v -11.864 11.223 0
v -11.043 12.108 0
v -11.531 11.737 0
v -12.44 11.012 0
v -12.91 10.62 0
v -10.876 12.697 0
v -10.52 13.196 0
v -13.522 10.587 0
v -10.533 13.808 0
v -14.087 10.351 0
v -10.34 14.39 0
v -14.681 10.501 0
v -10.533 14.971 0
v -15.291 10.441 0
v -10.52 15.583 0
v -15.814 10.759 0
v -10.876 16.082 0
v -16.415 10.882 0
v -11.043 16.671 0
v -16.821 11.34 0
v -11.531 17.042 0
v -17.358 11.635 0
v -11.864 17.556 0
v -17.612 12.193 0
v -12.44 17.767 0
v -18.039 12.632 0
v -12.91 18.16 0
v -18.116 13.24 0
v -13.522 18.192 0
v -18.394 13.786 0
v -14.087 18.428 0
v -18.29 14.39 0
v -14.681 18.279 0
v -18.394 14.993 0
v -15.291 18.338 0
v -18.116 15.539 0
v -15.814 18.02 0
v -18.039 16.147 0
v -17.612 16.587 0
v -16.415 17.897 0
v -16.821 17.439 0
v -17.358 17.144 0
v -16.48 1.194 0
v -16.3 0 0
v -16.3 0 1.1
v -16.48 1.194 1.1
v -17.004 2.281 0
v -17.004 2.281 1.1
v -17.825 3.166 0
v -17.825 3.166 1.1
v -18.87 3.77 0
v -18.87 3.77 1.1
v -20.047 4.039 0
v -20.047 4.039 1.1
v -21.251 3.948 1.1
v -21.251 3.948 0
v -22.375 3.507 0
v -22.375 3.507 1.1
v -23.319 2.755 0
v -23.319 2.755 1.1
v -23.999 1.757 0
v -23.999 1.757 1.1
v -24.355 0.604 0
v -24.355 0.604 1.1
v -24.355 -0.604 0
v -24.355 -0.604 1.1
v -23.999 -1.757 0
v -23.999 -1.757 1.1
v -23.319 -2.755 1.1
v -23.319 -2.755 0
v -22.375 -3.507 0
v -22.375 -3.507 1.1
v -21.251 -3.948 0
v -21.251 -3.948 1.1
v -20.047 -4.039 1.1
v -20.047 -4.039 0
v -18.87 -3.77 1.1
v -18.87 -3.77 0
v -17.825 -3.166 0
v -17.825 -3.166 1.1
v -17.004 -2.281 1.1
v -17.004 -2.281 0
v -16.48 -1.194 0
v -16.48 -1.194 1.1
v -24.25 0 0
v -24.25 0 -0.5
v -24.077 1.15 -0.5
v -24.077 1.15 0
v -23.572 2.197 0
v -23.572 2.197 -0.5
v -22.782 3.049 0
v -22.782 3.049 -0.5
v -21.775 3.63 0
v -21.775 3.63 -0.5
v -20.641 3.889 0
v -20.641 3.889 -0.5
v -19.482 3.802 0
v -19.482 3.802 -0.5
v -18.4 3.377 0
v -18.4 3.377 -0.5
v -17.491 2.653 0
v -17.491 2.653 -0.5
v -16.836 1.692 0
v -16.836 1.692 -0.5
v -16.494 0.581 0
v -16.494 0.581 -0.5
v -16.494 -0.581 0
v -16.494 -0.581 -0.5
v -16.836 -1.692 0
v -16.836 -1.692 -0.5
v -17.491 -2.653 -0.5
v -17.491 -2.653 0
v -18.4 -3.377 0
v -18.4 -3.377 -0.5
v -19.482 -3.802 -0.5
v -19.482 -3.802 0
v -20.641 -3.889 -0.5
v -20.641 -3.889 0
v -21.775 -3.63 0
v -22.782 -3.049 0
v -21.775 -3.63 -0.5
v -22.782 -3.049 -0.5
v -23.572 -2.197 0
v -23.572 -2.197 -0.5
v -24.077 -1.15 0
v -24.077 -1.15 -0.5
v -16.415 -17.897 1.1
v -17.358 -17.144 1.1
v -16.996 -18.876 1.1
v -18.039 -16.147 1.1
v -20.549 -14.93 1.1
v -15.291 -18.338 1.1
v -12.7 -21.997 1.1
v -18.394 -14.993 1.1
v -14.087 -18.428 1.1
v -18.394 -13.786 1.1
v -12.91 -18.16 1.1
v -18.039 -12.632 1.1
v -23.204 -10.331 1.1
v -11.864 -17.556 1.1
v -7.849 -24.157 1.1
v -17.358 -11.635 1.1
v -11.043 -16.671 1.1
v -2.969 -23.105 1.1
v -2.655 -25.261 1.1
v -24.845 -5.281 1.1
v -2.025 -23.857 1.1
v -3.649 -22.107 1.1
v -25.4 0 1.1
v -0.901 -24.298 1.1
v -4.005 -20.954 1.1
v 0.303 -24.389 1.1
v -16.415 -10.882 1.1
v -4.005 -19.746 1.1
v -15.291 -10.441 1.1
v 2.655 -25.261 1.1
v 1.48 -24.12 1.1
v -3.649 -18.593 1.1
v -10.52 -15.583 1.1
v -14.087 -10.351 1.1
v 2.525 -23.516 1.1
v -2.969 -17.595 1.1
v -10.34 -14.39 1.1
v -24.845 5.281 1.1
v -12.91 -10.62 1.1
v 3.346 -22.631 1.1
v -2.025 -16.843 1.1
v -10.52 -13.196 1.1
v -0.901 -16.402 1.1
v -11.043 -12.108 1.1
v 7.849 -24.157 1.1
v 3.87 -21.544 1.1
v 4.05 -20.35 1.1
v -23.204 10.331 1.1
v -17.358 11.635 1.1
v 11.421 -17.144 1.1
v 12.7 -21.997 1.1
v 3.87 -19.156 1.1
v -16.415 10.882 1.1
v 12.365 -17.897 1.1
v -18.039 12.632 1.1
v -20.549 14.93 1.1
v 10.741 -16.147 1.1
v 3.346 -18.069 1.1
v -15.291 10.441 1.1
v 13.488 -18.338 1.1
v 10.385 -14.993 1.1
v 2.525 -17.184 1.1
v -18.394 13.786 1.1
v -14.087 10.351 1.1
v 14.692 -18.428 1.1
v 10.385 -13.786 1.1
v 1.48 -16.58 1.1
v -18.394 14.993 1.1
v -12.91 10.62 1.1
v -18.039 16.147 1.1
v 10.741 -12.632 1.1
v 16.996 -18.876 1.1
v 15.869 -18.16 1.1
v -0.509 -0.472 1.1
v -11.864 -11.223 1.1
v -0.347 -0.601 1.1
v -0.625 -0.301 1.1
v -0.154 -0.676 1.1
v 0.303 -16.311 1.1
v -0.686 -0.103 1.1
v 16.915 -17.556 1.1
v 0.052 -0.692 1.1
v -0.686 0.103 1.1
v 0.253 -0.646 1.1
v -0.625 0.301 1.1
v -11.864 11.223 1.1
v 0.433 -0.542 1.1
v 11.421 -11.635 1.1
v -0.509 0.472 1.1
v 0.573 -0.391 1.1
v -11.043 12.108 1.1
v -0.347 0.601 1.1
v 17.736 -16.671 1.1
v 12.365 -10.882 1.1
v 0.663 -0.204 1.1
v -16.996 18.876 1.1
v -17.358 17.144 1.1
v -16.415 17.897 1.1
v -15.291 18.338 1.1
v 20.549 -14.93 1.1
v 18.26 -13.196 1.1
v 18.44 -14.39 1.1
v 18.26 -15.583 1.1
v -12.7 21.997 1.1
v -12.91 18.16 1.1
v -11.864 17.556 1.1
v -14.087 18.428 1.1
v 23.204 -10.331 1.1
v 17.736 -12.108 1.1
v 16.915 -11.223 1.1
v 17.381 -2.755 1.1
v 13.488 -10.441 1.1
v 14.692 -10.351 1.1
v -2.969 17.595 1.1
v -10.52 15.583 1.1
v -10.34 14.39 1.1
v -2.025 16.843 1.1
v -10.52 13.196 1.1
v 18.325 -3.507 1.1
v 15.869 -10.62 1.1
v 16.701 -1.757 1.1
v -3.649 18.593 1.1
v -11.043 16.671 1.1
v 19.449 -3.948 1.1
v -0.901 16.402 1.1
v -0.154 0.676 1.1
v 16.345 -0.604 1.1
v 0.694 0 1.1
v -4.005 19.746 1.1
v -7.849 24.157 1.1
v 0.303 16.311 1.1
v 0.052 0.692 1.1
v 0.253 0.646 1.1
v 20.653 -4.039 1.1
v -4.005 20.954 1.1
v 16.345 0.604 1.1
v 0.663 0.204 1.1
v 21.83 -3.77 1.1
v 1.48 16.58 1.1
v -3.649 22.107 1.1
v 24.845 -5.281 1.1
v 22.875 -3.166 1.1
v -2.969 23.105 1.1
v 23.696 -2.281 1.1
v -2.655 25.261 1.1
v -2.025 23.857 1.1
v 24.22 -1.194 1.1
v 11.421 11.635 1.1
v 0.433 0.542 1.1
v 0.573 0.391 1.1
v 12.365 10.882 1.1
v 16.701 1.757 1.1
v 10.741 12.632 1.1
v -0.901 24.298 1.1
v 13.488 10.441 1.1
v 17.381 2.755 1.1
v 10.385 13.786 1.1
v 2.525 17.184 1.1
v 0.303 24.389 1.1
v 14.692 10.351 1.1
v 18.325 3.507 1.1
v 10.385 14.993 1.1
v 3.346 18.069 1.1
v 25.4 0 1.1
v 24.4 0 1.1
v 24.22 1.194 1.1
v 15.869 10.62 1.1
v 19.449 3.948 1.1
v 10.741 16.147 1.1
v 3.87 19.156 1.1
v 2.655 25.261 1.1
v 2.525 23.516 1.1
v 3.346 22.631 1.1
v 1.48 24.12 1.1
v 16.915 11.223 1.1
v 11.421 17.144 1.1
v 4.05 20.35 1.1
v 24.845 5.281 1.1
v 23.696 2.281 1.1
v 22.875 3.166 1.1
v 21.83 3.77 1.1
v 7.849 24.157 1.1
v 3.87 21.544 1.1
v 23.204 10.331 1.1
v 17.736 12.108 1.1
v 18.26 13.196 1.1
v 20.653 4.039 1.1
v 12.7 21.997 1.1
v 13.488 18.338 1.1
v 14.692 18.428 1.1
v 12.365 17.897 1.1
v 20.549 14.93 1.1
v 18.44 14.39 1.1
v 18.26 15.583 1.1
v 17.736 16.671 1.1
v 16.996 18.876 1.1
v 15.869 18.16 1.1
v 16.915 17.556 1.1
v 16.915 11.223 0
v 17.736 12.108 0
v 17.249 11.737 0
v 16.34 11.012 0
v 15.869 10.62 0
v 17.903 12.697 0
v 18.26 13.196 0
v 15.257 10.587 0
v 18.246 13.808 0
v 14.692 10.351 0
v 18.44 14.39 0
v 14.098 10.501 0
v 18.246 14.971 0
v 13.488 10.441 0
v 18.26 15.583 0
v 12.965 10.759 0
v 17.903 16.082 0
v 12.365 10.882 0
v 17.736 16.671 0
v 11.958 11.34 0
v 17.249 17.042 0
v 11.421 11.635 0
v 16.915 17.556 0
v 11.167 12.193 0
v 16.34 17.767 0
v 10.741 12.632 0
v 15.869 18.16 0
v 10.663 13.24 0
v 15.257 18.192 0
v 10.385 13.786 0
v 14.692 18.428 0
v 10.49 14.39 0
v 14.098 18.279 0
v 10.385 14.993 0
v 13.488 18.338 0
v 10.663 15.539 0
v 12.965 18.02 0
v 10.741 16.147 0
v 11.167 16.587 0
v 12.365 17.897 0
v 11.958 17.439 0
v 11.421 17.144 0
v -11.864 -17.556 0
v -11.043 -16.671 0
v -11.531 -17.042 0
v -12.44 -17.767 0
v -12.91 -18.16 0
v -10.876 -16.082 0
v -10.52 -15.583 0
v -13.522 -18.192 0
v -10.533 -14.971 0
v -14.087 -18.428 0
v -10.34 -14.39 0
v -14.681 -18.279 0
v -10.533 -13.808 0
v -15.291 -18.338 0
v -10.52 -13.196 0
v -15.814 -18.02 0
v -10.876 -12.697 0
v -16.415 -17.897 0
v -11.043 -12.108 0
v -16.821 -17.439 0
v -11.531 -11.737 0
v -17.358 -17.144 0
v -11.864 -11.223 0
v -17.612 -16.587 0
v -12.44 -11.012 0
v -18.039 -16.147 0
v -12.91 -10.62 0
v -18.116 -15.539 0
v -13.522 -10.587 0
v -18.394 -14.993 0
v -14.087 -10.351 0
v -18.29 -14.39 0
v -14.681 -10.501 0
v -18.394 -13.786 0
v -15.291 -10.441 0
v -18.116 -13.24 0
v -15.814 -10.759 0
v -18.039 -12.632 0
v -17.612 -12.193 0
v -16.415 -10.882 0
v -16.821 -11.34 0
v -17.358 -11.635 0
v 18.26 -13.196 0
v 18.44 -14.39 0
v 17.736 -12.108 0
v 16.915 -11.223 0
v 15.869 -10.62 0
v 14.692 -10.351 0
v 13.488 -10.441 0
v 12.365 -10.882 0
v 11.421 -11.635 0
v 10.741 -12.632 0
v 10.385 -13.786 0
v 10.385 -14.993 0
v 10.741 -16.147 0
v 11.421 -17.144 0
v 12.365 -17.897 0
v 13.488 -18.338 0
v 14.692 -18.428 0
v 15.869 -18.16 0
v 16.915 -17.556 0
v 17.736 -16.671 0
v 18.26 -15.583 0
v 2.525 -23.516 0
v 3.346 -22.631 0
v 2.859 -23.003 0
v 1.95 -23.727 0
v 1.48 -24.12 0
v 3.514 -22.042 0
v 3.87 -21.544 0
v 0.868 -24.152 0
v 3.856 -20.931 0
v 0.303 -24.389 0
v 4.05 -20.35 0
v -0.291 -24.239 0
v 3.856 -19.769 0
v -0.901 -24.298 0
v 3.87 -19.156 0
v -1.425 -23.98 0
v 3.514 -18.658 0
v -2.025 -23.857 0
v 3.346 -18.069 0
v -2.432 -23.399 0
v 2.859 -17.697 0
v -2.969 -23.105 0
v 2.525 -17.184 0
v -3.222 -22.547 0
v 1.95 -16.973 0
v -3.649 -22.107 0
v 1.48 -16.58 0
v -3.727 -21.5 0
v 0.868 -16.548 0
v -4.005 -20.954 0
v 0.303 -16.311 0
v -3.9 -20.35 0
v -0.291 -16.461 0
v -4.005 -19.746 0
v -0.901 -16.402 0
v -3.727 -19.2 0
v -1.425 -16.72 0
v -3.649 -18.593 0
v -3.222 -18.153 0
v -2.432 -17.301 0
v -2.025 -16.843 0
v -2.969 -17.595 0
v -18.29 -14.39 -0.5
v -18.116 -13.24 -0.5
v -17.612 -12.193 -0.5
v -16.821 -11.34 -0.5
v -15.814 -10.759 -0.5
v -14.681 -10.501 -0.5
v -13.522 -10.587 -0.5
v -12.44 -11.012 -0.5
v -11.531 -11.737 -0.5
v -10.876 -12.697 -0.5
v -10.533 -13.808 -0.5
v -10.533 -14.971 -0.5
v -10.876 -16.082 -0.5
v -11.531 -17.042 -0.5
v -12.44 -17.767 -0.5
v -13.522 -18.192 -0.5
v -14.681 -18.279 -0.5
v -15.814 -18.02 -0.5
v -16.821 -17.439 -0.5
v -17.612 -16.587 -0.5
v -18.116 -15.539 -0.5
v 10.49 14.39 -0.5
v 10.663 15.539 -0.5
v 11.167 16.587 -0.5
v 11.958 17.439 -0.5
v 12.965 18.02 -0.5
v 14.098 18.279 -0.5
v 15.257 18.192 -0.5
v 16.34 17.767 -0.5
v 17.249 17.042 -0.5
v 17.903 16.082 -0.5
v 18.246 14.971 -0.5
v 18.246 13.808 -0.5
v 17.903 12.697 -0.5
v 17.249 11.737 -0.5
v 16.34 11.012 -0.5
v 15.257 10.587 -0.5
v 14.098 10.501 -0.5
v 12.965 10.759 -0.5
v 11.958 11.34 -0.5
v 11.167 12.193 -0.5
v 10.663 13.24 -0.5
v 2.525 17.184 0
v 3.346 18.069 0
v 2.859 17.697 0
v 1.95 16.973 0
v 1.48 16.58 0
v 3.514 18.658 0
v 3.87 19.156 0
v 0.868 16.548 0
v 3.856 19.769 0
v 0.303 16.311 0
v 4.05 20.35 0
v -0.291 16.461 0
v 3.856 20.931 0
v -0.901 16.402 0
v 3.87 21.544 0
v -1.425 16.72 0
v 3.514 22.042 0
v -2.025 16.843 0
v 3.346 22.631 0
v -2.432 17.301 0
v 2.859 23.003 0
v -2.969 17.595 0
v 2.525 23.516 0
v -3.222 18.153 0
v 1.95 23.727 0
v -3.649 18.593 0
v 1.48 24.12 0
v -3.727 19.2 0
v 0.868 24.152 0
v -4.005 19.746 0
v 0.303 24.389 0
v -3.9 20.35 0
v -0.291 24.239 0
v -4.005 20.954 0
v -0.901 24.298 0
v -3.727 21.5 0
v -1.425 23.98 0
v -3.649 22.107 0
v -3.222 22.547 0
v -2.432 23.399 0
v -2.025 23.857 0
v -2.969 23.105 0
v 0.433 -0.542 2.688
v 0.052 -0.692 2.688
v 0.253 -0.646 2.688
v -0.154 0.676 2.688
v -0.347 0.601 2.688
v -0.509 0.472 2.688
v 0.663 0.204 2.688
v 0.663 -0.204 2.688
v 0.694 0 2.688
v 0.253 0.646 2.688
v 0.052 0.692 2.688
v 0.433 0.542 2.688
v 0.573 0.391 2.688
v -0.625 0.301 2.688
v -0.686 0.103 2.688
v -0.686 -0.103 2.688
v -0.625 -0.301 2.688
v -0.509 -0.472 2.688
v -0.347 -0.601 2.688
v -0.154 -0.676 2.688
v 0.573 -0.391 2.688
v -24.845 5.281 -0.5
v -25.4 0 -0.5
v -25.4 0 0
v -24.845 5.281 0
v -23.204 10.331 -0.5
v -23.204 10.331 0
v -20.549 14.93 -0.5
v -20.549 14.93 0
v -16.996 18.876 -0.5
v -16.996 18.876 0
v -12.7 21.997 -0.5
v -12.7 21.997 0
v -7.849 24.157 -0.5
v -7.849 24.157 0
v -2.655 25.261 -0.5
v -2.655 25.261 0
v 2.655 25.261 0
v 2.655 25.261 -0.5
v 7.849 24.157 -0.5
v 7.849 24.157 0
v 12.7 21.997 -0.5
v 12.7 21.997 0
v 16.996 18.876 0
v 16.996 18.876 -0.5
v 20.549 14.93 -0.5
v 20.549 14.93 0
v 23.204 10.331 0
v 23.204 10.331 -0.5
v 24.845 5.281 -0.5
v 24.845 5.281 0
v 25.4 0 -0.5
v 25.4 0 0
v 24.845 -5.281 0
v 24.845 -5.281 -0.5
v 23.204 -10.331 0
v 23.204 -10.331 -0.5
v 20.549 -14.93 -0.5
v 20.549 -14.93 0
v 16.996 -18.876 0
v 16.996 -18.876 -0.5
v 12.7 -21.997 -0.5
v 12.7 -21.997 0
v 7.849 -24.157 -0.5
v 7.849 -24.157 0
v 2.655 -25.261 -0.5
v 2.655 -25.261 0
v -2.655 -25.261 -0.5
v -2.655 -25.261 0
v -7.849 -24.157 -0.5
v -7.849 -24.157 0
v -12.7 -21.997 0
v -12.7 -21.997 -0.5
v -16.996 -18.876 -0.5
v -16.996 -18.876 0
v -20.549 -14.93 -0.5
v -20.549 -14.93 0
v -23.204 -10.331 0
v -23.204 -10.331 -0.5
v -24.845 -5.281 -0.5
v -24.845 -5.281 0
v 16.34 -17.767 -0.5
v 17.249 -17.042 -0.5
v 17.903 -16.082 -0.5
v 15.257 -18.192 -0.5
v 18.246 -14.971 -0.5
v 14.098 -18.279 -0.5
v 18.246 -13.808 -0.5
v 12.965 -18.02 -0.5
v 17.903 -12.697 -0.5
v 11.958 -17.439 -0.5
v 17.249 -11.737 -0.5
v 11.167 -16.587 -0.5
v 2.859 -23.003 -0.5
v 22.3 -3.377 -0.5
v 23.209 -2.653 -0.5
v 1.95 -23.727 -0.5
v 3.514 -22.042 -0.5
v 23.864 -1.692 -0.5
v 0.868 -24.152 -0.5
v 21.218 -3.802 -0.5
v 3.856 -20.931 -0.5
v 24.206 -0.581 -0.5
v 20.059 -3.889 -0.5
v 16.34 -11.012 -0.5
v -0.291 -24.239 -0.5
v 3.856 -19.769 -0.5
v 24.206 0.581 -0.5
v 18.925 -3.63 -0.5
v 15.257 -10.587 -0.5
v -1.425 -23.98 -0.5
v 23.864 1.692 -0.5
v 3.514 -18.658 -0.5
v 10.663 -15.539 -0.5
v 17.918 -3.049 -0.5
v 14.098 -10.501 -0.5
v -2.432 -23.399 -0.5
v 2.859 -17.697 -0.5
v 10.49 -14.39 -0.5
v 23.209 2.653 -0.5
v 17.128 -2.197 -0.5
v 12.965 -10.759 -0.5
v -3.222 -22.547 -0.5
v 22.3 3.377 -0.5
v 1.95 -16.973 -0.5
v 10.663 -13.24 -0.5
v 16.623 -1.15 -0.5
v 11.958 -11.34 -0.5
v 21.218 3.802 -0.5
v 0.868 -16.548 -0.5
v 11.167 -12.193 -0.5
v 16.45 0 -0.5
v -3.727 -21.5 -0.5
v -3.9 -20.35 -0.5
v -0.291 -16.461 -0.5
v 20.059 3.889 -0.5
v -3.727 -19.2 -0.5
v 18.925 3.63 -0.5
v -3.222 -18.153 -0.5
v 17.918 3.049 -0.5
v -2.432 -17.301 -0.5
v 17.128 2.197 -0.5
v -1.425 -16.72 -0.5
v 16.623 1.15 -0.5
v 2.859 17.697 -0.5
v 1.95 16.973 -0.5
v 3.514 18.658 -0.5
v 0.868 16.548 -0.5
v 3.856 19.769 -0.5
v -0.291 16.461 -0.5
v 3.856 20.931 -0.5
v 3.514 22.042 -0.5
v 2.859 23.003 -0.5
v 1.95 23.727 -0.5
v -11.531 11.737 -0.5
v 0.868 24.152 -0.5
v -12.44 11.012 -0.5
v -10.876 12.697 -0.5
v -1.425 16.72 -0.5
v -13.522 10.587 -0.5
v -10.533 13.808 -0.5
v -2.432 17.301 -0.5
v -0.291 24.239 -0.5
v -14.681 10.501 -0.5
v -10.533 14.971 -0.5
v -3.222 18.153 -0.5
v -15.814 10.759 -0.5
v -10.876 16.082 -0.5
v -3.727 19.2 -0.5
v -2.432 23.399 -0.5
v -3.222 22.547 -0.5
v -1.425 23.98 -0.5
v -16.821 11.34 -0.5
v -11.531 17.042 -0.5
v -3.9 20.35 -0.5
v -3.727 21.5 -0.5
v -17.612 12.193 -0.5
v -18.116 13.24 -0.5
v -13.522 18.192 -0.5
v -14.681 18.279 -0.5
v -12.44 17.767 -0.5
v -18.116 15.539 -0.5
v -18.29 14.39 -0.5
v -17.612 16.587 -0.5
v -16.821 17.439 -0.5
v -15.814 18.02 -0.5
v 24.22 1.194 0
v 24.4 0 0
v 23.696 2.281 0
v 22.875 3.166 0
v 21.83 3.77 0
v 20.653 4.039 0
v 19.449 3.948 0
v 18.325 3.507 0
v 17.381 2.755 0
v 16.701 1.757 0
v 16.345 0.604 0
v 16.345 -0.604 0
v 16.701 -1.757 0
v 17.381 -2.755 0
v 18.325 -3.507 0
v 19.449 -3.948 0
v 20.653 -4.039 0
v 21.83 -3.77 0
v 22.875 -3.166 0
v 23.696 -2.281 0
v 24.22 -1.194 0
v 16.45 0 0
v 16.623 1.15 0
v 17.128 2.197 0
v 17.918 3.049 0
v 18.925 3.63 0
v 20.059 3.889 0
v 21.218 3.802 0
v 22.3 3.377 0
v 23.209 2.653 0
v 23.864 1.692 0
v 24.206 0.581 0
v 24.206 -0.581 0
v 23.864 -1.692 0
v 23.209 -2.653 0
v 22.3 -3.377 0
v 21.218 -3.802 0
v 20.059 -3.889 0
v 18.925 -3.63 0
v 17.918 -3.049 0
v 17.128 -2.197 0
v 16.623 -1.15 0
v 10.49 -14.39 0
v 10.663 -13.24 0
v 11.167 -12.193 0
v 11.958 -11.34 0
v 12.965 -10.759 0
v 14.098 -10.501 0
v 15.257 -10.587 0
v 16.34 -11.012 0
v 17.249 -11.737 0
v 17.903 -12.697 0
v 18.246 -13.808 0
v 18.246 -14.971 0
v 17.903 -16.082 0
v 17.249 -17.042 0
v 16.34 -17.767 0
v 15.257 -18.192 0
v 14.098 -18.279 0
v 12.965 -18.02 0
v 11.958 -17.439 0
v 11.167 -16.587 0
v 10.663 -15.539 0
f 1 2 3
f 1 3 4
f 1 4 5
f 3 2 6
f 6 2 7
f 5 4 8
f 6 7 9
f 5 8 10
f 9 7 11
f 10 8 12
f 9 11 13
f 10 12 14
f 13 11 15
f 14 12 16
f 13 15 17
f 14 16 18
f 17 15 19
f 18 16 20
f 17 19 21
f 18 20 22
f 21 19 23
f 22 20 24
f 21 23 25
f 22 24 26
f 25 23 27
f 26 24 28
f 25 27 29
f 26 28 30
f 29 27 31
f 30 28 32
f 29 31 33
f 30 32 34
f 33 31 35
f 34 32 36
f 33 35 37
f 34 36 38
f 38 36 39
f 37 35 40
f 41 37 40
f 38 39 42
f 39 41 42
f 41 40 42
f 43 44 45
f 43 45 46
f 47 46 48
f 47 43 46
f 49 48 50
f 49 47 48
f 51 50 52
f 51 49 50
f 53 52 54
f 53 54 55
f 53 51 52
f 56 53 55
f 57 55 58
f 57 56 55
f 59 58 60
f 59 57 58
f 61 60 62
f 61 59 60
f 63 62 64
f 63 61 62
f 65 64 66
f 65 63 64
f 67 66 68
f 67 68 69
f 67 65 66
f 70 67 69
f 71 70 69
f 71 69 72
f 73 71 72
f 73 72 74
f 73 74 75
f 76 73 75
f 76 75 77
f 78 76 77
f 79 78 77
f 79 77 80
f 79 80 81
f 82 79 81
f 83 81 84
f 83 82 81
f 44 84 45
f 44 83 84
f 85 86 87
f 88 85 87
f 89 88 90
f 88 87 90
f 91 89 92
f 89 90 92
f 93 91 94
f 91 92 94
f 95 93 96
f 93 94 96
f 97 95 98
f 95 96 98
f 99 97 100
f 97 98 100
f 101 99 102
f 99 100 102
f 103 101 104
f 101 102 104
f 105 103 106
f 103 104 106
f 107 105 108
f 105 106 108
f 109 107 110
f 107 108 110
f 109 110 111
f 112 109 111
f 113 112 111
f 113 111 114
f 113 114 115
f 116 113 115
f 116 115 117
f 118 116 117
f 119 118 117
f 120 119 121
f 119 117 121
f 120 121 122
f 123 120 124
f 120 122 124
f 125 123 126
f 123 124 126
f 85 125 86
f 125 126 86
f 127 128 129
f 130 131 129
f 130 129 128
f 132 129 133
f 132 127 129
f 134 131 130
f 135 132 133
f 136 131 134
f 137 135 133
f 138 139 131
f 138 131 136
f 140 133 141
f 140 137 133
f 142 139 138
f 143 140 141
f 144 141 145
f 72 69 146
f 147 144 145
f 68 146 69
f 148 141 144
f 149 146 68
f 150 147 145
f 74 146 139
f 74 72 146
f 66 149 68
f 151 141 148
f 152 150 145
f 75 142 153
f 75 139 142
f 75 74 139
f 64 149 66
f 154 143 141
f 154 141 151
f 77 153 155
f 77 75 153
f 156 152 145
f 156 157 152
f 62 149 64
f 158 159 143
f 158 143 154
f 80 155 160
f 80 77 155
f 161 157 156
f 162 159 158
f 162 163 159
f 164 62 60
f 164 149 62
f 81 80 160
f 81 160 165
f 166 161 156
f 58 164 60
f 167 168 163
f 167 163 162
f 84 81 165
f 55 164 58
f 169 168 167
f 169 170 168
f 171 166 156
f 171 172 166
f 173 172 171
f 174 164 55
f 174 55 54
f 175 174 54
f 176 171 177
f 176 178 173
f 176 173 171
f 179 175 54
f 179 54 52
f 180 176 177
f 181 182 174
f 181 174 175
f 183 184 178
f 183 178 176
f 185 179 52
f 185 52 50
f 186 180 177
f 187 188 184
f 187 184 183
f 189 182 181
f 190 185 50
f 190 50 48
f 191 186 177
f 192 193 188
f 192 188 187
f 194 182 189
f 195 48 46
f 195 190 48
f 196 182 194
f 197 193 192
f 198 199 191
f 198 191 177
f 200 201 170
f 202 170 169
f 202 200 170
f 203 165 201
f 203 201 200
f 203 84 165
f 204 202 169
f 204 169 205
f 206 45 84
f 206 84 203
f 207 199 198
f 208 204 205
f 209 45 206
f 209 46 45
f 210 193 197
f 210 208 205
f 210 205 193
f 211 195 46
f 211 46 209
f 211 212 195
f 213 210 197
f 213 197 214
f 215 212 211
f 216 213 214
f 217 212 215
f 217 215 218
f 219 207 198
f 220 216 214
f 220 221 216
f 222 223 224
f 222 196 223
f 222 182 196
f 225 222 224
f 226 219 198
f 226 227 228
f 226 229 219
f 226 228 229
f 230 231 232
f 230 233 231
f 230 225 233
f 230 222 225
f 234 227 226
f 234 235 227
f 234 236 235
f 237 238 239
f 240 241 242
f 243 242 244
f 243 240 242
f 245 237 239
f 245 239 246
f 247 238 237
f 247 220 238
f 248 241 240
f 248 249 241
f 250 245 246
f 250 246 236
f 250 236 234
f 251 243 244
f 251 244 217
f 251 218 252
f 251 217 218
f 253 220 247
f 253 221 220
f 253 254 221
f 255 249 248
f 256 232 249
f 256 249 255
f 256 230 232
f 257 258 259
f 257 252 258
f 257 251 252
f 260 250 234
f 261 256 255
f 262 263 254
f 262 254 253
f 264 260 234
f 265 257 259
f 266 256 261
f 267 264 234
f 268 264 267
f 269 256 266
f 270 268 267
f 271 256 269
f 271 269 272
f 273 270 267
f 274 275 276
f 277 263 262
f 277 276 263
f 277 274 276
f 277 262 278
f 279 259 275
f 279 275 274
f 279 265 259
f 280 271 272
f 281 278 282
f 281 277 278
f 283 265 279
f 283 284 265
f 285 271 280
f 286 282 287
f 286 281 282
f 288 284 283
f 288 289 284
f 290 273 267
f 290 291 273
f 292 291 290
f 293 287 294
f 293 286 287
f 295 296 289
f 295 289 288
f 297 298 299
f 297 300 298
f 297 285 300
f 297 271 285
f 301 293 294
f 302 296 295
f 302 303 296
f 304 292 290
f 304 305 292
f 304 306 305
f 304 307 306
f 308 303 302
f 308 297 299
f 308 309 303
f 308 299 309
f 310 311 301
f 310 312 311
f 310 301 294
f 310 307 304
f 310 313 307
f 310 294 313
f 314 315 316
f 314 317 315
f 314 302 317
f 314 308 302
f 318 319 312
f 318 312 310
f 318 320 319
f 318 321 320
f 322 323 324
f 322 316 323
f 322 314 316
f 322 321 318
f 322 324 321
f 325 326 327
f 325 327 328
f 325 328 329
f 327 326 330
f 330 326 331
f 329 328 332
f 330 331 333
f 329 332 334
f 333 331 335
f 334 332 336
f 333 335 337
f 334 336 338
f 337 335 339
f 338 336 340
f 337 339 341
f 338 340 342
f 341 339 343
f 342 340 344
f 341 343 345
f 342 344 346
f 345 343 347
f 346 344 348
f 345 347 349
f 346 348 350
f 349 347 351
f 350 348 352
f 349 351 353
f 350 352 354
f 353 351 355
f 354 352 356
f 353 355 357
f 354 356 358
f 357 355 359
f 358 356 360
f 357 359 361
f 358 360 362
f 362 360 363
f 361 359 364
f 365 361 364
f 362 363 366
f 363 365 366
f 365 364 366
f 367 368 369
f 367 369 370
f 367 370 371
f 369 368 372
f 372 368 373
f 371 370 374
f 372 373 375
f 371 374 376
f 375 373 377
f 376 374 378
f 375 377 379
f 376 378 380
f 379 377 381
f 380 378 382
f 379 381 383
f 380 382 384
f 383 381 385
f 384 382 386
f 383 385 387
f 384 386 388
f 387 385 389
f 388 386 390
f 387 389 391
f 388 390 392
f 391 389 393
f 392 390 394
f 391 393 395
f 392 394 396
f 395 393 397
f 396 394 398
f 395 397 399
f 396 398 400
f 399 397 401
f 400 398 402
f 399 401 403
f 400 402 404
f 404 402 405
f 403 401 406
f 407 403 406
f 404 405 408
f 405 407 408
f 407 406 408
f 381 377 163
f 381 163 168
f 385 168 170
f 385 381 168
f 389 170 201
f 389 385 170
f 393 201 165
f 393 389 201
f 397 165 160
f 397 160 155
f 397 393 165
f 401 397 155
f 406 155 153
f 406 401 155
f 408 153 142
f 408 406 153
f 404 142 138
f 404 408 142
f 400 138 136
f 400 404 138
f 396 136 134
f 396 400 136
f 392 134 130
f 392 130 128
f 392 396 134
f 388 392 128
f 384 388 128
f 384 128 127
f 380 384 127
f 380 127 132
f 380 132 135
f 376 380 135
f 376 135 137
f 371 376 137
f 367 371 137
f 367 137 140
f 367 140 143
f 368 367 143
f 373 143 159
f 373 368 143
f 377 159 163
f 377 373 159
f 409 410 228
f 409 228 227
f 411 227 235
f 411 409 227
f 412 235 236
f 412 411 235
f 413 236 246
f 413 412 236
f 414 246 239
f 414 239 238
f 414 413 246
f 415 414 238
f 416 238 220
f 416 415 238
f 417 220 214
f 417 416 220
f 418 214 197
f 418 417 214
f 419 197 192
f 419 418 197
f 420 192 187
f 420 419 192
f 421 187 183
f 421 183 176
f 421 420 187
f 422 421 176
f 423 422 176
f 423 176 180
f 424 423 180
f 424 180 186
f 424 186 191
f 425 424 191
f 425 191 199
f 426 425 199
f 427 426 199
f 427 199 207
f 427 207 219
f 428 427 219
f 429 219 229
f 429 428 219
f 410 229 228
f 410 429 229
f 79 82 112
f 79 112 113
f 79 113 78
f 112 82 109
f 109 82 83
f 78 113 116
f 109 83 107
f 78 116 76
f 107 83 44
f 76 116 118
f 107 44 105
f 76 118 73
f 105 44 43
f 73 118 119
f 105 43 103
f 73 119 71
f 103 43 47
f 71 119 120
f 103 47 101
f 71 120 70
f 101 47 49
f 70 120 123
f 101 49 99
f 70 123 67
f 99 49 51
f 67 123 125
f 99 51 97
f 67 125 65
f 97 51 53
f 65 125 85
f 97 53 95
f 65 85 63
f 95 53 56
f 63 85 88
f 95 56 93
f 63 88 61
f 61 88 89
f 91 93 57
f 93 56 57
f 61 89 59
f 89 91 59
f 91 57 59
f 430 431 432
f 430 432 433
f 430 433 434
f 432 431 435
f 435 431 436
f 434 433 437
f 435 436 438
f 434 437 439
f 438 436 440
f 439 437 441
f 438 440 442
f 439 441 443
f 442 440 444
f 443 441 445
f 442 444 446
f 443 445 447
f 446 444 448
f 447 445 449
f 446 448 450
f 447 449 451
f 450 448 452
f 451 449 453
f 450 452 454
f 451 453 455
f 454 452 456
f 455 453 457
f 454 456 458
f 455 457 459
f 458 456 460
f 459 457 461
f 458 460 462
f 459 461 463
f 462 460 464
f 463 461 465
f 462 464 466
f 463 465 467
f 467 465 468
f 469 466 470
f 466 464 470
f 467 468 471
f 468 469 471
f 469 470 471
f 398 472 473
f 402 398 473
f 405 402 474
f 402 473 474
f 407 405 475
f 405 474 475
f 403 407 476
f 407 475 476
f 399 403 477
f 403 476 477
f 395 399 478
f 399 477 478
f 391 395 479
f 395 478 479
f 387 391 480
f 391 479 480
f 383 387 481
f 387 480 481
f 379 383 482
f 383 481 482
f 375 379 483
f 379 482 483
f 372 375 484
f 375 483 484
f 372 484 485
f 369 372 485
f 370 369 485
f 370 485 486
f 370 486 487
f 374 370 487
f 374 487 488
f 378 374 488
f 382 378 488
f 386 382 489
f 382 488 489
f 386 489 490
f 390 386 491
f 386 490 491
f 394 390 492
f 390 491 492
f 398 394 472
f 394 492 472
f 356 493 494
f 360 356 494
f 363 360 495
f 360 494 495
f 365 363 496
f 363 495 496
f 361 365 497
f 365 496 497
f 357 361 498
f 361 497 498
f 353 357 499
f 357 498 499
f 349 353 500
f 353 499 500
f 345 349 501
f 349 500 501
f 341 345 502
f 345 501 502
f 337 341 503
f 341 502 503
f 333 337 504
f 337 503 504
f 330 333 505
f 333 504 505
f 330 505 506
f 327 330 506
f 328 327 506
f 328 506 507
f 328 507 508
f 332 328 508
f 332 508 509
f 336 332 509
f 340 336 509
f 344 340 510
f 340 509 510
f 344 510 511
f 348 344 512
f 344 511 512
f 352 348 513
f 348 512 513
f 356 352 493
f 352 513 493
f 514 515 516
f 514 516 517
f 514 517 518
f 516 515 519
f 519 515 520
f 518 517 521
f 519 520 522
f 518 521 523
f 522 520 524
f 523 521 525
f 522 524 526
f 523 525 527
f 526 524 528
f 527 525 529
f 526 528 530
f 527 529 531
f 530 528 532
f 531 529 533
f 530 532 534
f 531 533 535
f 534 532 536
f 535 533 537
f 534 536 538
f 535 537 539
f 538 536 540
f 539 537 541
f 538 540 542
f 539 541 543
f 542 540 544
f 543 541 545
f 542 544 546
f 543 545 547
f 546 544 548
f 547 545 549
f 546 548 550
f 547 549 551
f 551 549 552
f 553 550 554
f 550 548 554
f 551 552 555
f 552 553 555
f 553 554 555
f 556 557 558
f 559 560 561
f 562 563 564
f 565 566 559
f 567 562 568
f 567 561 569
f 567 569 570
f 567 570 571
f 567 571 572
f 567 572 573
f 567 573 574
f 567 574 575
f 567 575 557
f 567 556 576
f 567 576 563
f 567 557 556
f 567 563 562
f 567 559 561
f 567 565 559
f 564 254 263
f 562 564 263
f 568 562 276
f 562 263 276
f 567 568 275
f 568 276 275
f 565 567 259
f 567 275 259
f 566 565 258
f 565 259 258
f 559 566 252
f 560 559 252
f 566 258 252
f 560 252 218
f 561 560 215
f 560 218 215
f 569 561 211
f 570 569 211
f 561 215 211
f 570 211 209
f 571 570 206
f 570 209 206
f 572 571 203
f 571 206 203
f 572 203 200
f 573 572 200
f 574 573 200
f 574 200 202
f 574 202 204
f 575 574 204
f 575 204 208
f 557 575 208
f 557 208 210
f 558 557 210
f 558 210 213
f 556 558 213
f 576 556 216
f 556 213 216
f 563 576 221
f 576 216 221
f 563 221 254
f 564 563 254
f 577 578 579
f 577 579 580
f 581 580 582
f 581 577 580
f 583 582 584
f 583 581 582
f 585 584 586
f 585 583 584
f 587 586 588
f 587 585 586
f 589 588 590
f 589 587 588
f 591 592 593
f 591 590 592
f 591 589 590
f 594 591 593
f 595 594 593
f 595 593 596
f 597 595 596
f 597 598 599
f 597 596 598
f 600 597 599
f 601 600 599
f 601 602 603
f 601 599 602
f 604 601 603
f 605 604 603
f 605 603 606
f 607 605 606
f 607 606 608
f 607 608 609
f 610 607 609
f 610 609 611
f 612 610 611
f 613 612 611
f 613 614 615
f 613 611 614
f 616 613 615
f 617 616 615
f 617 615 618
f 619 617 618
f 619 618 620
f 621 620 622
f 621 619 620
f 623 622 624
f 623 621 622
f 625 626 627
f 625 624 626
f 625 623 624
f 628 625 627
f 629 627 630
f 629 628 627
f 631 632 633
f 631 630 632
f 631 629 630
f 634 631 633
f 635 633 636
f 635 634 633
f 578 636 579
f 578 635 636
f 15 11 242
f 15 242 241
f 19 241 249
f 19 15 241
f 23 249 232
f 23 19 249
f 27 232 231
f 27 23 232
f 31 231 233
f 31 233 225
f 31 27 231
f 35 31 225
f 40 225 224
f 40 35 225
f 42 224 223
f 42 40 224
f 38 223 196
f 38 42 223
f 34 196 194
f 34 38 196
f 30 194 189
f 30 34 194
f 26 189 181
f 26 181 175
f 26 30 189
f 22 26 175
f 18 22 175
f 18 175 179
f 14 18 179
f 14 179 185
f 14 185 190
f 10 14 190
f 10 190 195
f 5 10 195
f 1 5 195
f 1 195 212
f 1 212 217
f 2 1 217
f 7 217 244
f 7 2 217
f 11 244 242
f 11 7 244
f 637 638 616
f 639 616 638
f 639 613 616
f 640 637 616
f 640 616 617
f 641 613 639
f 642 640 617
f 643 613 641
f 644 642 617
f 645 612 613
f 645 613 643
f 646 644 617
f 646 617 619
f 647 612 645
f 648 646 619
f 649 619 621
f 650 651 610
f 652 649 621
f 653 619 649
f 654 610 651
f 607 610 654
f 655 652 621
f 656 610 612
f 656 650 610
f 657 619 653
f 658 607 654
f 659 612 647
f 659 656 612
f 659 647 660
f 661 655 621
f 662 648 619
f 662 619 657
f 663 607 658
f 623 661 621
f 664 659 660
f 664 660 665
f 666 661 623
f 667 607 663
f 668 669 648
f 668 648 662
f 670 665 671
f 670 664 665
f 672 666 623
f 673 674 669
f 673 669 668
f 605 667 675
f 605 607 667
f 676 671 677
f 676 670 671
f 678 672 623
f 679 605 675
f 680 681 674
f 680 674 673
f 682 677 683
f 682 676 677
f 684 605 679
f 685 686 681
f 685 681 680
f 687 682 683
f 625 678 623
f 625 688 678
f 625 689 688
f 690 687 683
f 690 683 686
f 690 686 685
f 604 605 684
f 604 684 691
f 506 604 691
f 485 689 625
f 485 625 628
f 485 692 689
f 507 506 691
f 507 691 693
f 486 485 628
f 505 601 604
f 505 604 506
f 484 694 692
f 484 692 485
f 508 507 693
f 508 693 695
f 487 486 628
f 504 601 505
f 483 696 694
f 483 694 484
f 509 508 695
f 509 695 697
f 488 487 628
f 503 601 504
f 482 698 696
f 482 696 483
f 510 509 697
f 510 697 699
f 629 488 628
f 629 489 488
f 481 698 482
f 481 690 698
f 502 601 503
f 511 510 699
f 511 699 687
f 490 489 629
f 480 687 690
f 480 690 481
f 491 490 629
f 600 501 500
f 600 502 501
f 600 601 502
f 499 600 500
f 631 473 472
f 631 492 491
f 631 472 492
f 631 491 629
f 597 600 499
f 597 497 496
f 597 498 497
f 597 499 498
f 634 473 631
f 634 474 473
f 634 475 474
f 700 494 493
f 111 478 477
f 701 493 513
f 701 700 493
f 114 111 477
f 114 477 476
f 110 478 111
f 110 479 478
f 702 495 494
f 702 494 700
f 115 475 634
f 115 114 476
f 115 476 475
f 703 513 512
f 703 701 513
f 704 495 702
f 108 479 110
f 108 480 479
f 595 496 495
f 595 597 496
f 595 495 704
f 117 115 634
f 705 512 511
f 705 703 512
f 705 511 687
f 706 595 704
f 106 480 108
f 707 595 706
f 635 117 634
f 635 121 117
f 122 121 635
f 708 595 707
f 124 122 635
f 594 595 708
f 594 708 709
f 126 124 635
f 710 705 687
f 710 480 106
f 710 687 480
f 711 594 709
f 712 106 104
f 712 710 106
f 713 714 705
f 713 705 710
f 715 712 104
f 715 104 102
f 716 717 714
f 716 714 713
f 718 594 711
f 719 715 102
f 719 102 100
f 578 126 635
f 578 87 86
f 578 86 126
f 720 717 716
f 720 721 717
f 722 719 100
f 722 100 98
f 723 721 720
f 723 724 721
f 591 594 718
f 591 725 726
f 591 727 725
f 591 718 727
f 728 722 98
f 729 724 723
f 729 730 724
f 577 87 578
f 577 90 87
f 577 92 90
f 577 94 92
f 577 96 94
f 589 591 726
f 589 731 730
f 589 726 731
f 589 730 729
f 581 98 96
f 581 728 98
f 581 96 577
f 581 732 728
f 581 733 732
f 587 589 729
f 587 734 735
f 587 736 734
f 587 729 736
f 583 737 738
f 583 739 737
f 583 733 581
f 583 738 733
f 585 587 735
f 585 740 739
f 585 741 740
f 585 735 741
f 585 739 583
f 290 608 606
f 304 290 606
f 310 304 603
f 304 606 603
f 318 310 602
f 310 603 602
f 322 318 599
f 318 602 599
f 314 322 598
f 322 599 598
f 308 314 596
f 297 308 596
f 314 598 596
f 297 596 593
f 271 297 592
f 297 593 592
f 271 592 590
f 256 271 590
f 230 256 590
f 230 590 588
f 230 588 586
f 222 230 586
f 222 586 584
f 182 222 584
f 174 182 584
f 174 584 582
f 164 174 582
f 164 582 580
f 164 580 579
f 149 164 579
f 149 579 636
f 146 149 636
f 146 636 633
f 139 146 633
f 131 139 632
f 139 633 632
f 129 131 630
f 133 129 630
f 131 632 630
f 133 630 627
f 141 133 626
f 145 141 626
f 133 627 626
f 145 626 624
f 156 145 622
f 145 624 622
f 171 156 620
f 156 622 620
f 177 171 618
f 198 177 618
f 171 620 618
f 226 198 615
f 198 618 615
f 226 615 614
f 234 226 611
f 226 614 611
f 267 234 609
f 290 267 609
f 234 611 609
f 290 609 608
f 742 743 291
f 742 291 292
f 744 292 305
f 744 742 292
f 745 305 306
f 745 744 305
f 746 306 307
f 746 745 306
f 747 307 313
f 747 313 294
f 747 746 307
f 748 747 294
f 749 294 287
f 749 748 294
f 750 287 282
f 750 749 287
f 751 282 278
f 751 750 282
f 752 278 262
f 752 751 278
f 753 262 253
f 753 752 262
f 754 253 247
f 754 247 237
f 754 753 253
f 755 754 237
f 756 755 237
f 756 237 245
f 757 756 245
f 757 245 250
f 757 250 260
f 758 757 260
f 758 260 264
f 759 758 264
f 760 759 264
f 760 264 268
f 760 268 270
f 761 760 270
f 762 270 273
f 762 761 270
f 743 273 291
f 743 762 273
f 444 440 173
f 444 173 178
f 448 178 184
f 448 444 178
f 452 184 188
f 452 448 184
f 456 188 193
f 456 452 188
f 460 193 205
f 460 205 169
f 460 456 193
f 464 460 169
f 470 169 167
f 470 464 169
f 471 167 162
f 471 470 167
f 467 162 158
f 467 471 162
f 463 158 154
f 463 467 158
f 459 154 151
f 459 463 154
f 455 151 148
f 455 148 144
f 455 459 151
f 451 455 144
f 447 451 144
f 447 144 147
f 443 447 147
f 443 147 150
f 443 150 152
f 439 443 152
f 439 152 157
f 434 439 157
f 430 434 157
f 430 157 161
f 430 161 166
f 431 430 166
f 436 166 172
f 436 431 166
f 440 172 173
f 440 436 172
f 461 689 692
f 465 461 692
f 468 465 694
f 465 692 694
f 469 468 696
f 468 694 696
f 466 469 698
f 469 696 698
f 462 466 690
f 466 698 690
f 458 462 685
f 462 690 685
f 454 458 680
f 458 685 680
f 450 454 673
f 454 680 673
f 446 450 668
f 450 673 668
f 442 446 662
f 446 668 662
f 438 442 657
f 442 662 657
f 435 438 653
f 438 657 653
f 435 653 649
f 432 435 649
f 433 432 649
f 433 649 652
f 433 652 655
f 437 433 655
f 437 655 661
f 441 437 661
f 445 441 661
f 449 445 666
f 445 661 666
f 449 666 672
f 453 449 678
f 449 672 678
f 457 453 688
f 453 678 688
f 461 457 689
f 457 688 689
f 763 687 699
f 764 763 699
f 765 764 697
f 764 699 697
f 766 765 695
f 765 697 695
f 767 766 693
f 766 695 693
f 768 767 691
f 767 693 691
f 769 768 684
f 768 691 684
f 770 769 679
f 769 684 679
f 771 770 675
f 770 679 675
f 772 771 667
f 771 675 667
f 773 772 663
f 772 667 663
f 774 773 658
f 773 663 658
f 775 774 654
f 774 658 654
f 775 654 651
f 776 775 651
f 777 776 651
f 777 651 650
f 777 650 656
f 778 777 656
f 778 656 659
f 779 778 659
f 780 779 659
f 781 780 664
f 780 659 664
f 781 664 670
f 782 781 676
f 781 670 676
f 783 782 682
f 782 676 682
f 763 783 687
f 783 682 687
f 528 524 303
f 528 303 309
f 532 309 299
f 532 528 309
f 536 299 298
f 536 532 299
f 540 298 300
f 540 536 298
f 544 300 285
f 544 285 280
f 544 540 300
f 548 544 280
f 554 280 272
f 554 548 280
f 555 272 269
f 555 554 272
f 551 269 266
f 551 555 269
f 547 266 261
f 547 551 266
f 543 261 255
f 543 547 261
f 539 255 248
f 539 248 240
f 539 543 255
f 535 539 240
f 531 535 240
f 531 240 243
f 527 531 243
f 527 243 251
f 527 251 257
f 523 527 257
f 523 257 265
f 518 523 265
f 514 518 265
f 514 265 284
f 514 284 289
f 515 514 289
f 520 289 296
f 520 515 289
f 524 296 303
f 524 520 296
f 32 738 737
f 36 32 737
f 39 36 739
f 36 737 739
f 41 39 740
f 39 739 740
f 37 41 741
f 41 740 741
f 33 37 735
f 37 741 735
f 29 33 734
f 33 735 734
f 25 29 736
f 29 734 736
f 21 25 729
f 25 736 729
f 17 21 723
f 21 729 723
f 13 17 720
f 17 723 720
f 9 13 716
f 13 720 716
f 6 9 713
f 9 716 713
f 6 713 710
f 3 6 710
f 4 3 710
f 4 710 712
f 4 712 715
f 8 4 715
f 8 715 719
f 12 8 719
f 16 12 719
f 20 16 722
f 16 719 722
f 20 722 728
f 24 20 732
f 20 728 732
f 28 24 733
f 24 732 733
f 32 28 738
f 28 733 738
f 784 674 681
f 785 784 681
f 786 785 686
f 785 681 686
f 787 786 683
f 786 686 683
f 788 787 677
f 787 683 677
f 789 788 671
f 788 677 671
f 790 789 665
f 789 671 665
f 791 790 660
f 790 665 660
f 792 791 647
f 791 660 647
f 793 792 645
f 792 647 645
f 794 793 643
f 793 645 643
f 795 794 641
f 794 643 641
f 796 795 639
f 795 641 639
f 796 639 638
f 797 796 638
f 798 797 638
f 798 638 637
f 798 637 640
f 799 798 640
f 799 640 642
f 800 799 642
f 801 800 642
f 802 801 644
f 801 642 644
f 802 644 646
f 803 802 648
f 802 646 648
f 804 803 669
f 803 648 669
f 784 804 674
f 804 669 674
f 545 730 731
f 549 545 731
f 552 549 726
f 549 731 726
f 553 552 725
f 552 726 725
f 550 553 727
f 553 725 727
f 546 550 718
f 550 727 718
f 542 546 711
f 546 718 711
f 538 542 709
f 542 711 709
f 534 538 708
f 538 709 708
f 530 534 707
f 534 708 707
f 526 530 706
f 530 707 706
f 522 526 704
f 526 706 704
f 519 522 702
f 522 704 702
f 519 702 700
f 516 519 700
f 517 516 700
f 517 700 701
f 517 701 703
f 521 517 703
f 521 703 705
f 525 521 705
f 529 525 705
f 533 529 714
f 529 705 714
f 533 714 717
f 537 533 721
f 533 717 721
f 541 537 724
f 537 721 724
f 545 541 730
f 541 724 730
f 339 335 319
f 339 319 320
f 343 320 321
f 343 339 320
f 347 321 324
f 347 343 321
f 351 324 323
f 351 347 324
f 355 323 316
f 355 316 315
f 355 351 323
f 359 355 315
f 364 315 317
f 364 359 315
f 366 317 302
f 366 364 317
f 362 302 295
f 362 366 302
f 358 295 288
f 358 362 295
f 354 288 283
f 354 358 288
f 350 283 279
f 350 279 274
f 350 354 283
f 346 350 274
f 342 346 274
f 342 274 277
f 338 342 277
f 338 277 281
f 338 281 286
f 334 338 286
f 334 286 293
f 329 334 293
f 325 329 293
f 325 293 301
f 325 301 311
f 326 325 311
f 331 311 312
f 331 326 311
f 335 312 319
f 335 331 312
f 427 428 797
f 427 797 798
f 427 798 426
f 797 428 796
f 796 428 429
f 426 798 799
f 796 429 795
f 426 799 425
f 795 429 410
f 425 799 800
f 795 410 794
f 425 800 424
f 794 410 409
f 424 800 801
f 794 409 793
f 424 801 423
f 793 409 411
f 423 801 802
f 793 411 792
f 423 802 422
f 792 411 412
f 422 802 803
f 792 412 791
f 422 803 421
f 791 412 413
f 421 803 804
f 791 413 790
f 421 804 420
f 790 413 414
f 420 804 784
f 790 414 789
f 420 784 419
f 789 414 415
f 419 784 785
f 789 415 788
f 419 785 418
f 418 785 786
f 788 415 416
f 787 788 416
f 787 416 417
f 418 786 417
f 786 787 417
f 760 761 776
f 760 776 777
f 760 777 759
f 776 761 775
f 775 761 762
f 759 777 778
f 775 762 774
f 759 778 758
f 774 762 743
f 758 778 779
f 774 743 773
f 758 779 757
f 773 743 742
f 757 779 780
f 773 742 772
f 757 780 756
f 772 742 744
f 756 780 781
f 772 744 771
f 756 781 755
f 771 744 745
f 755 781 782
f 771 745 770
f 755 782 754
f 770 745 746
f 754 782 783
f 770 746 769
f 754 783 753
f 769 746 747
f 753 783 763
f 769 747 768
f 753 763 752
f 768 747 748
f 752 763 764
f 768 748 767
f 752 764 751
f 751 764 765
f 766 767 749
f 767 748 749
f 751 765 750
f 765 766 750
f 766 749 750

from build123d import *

# Parameters (mm, degrees)
SKETCH1_R           = 25.4
SKETCH1_R_2         = 4.05
BOSS_EXTRUDE1_DEPTH = 1.1
SKETCH2_R           = 0.69375
BOSS_EXTRUDE2_DEPTH = 1.5875
BOSS_EXTRUDE3_START = 0.5
SKETCH3_R           = 25.4
SKETCH3_R_2         = 3.9
BOSS_EXTRUDE3_DEPTH = 0.5


with BuildPart() as part:
    # Sketch1 → Boss-Extrude1 (new body)
    with BuildSketch(Plane.XY):
        Circle(SKETCH1_R)
        with Locations((0, 20.35)):
            Circle(SKETCH1_R_2, mode=Mode.SUBTRACT)
        with Locations((14.389622997, 14.389622997)):
            Circle(SKETCH1_R_2, mode=Mode.SUBTRACT)
        with Locations((20.35, 0)):
            Circle(SKETCH1_R_2, mode=Mode.SUBTRACT)
        with Locations((14.389622997, -14.389622997)):
            Circle(SKETCH1_R_2, mode=Mode.SUBTRACT)
        with Locations((0, -20.35)):
            Circle(SKETCH1_R_2, mode=Mode.SUBTRACT)
        with Locations((-14.389622997, -14.389622997)):
            Circle(SKETCH1_R_2, mode=Mode.SUBTRACT)
        with Locations((-20.35, 0)):
            Circle(SKETCH1_R_2, mode=Mode.SUBTRACT)
        with Locations((-14.389622997, 14.389622997)):
            Circle(SKETCH1_R_2, mode=Mode.SUBTRACT)
    extrude(amount=BOSS_EXTRUDE1_DEPTH)

    # Sketch2 → Boss-Extrude2 (add)
    with BuildSketch(Plane.XY.offset(1.1)):
        Circle(SKETCH2_R)
    extrude(amount=BOSS_EXTRUDE2_DEPTH)

    # Sketch3 → Boss-Extrude3 (add)
    with BuildSketch(Plane(origin=(0, 0, 0), x_dir=(-1, 0, 0), z_dir=(0, 0, -1)).offset(BOSS_EXTRUDE3_START)):
        Circle(SKETCH3_R)
        with Locations((0, 20.35)):
            Circle(SKETCH3_R_2, mode=Mode.SUBTRACT)
        with Locations((14.389622997, 14.389622997)):
            Circle(SKETCH3_R_2, mode=Mode.SUBTRACT)
        with Locations((20.35, 0)):
            Circle(SKETCH3_R_2, mode=Mode.SUBTRACT)
        with Locations((14.389622997, -14.389622997)):
            Circle(SKETCH3_R_2, mode=Mode.SUBTRACT)
        with Locations((0, -20.35)):
            Circle(SKETCH3_R_2, mode=Mode.SUBTRACT)
        with Locations((-14.389622997, -14.389622997)):
            Circle(SKETCH3_R_2, mode=Mode.SUBTRACT)
        with Locations((-20.35, 0)):
            Circle(SKETCH3_R_2, mode=Mode.SUBTRACT)
        with Locations((-14.389622997, 14.389622997)):
            Circle(SKETCH3_R_2, mode=Mode.SUBTRACT)
    extrude(amount=-BOSS_EXTRUDE3_DEPTH)


solid = part.part
